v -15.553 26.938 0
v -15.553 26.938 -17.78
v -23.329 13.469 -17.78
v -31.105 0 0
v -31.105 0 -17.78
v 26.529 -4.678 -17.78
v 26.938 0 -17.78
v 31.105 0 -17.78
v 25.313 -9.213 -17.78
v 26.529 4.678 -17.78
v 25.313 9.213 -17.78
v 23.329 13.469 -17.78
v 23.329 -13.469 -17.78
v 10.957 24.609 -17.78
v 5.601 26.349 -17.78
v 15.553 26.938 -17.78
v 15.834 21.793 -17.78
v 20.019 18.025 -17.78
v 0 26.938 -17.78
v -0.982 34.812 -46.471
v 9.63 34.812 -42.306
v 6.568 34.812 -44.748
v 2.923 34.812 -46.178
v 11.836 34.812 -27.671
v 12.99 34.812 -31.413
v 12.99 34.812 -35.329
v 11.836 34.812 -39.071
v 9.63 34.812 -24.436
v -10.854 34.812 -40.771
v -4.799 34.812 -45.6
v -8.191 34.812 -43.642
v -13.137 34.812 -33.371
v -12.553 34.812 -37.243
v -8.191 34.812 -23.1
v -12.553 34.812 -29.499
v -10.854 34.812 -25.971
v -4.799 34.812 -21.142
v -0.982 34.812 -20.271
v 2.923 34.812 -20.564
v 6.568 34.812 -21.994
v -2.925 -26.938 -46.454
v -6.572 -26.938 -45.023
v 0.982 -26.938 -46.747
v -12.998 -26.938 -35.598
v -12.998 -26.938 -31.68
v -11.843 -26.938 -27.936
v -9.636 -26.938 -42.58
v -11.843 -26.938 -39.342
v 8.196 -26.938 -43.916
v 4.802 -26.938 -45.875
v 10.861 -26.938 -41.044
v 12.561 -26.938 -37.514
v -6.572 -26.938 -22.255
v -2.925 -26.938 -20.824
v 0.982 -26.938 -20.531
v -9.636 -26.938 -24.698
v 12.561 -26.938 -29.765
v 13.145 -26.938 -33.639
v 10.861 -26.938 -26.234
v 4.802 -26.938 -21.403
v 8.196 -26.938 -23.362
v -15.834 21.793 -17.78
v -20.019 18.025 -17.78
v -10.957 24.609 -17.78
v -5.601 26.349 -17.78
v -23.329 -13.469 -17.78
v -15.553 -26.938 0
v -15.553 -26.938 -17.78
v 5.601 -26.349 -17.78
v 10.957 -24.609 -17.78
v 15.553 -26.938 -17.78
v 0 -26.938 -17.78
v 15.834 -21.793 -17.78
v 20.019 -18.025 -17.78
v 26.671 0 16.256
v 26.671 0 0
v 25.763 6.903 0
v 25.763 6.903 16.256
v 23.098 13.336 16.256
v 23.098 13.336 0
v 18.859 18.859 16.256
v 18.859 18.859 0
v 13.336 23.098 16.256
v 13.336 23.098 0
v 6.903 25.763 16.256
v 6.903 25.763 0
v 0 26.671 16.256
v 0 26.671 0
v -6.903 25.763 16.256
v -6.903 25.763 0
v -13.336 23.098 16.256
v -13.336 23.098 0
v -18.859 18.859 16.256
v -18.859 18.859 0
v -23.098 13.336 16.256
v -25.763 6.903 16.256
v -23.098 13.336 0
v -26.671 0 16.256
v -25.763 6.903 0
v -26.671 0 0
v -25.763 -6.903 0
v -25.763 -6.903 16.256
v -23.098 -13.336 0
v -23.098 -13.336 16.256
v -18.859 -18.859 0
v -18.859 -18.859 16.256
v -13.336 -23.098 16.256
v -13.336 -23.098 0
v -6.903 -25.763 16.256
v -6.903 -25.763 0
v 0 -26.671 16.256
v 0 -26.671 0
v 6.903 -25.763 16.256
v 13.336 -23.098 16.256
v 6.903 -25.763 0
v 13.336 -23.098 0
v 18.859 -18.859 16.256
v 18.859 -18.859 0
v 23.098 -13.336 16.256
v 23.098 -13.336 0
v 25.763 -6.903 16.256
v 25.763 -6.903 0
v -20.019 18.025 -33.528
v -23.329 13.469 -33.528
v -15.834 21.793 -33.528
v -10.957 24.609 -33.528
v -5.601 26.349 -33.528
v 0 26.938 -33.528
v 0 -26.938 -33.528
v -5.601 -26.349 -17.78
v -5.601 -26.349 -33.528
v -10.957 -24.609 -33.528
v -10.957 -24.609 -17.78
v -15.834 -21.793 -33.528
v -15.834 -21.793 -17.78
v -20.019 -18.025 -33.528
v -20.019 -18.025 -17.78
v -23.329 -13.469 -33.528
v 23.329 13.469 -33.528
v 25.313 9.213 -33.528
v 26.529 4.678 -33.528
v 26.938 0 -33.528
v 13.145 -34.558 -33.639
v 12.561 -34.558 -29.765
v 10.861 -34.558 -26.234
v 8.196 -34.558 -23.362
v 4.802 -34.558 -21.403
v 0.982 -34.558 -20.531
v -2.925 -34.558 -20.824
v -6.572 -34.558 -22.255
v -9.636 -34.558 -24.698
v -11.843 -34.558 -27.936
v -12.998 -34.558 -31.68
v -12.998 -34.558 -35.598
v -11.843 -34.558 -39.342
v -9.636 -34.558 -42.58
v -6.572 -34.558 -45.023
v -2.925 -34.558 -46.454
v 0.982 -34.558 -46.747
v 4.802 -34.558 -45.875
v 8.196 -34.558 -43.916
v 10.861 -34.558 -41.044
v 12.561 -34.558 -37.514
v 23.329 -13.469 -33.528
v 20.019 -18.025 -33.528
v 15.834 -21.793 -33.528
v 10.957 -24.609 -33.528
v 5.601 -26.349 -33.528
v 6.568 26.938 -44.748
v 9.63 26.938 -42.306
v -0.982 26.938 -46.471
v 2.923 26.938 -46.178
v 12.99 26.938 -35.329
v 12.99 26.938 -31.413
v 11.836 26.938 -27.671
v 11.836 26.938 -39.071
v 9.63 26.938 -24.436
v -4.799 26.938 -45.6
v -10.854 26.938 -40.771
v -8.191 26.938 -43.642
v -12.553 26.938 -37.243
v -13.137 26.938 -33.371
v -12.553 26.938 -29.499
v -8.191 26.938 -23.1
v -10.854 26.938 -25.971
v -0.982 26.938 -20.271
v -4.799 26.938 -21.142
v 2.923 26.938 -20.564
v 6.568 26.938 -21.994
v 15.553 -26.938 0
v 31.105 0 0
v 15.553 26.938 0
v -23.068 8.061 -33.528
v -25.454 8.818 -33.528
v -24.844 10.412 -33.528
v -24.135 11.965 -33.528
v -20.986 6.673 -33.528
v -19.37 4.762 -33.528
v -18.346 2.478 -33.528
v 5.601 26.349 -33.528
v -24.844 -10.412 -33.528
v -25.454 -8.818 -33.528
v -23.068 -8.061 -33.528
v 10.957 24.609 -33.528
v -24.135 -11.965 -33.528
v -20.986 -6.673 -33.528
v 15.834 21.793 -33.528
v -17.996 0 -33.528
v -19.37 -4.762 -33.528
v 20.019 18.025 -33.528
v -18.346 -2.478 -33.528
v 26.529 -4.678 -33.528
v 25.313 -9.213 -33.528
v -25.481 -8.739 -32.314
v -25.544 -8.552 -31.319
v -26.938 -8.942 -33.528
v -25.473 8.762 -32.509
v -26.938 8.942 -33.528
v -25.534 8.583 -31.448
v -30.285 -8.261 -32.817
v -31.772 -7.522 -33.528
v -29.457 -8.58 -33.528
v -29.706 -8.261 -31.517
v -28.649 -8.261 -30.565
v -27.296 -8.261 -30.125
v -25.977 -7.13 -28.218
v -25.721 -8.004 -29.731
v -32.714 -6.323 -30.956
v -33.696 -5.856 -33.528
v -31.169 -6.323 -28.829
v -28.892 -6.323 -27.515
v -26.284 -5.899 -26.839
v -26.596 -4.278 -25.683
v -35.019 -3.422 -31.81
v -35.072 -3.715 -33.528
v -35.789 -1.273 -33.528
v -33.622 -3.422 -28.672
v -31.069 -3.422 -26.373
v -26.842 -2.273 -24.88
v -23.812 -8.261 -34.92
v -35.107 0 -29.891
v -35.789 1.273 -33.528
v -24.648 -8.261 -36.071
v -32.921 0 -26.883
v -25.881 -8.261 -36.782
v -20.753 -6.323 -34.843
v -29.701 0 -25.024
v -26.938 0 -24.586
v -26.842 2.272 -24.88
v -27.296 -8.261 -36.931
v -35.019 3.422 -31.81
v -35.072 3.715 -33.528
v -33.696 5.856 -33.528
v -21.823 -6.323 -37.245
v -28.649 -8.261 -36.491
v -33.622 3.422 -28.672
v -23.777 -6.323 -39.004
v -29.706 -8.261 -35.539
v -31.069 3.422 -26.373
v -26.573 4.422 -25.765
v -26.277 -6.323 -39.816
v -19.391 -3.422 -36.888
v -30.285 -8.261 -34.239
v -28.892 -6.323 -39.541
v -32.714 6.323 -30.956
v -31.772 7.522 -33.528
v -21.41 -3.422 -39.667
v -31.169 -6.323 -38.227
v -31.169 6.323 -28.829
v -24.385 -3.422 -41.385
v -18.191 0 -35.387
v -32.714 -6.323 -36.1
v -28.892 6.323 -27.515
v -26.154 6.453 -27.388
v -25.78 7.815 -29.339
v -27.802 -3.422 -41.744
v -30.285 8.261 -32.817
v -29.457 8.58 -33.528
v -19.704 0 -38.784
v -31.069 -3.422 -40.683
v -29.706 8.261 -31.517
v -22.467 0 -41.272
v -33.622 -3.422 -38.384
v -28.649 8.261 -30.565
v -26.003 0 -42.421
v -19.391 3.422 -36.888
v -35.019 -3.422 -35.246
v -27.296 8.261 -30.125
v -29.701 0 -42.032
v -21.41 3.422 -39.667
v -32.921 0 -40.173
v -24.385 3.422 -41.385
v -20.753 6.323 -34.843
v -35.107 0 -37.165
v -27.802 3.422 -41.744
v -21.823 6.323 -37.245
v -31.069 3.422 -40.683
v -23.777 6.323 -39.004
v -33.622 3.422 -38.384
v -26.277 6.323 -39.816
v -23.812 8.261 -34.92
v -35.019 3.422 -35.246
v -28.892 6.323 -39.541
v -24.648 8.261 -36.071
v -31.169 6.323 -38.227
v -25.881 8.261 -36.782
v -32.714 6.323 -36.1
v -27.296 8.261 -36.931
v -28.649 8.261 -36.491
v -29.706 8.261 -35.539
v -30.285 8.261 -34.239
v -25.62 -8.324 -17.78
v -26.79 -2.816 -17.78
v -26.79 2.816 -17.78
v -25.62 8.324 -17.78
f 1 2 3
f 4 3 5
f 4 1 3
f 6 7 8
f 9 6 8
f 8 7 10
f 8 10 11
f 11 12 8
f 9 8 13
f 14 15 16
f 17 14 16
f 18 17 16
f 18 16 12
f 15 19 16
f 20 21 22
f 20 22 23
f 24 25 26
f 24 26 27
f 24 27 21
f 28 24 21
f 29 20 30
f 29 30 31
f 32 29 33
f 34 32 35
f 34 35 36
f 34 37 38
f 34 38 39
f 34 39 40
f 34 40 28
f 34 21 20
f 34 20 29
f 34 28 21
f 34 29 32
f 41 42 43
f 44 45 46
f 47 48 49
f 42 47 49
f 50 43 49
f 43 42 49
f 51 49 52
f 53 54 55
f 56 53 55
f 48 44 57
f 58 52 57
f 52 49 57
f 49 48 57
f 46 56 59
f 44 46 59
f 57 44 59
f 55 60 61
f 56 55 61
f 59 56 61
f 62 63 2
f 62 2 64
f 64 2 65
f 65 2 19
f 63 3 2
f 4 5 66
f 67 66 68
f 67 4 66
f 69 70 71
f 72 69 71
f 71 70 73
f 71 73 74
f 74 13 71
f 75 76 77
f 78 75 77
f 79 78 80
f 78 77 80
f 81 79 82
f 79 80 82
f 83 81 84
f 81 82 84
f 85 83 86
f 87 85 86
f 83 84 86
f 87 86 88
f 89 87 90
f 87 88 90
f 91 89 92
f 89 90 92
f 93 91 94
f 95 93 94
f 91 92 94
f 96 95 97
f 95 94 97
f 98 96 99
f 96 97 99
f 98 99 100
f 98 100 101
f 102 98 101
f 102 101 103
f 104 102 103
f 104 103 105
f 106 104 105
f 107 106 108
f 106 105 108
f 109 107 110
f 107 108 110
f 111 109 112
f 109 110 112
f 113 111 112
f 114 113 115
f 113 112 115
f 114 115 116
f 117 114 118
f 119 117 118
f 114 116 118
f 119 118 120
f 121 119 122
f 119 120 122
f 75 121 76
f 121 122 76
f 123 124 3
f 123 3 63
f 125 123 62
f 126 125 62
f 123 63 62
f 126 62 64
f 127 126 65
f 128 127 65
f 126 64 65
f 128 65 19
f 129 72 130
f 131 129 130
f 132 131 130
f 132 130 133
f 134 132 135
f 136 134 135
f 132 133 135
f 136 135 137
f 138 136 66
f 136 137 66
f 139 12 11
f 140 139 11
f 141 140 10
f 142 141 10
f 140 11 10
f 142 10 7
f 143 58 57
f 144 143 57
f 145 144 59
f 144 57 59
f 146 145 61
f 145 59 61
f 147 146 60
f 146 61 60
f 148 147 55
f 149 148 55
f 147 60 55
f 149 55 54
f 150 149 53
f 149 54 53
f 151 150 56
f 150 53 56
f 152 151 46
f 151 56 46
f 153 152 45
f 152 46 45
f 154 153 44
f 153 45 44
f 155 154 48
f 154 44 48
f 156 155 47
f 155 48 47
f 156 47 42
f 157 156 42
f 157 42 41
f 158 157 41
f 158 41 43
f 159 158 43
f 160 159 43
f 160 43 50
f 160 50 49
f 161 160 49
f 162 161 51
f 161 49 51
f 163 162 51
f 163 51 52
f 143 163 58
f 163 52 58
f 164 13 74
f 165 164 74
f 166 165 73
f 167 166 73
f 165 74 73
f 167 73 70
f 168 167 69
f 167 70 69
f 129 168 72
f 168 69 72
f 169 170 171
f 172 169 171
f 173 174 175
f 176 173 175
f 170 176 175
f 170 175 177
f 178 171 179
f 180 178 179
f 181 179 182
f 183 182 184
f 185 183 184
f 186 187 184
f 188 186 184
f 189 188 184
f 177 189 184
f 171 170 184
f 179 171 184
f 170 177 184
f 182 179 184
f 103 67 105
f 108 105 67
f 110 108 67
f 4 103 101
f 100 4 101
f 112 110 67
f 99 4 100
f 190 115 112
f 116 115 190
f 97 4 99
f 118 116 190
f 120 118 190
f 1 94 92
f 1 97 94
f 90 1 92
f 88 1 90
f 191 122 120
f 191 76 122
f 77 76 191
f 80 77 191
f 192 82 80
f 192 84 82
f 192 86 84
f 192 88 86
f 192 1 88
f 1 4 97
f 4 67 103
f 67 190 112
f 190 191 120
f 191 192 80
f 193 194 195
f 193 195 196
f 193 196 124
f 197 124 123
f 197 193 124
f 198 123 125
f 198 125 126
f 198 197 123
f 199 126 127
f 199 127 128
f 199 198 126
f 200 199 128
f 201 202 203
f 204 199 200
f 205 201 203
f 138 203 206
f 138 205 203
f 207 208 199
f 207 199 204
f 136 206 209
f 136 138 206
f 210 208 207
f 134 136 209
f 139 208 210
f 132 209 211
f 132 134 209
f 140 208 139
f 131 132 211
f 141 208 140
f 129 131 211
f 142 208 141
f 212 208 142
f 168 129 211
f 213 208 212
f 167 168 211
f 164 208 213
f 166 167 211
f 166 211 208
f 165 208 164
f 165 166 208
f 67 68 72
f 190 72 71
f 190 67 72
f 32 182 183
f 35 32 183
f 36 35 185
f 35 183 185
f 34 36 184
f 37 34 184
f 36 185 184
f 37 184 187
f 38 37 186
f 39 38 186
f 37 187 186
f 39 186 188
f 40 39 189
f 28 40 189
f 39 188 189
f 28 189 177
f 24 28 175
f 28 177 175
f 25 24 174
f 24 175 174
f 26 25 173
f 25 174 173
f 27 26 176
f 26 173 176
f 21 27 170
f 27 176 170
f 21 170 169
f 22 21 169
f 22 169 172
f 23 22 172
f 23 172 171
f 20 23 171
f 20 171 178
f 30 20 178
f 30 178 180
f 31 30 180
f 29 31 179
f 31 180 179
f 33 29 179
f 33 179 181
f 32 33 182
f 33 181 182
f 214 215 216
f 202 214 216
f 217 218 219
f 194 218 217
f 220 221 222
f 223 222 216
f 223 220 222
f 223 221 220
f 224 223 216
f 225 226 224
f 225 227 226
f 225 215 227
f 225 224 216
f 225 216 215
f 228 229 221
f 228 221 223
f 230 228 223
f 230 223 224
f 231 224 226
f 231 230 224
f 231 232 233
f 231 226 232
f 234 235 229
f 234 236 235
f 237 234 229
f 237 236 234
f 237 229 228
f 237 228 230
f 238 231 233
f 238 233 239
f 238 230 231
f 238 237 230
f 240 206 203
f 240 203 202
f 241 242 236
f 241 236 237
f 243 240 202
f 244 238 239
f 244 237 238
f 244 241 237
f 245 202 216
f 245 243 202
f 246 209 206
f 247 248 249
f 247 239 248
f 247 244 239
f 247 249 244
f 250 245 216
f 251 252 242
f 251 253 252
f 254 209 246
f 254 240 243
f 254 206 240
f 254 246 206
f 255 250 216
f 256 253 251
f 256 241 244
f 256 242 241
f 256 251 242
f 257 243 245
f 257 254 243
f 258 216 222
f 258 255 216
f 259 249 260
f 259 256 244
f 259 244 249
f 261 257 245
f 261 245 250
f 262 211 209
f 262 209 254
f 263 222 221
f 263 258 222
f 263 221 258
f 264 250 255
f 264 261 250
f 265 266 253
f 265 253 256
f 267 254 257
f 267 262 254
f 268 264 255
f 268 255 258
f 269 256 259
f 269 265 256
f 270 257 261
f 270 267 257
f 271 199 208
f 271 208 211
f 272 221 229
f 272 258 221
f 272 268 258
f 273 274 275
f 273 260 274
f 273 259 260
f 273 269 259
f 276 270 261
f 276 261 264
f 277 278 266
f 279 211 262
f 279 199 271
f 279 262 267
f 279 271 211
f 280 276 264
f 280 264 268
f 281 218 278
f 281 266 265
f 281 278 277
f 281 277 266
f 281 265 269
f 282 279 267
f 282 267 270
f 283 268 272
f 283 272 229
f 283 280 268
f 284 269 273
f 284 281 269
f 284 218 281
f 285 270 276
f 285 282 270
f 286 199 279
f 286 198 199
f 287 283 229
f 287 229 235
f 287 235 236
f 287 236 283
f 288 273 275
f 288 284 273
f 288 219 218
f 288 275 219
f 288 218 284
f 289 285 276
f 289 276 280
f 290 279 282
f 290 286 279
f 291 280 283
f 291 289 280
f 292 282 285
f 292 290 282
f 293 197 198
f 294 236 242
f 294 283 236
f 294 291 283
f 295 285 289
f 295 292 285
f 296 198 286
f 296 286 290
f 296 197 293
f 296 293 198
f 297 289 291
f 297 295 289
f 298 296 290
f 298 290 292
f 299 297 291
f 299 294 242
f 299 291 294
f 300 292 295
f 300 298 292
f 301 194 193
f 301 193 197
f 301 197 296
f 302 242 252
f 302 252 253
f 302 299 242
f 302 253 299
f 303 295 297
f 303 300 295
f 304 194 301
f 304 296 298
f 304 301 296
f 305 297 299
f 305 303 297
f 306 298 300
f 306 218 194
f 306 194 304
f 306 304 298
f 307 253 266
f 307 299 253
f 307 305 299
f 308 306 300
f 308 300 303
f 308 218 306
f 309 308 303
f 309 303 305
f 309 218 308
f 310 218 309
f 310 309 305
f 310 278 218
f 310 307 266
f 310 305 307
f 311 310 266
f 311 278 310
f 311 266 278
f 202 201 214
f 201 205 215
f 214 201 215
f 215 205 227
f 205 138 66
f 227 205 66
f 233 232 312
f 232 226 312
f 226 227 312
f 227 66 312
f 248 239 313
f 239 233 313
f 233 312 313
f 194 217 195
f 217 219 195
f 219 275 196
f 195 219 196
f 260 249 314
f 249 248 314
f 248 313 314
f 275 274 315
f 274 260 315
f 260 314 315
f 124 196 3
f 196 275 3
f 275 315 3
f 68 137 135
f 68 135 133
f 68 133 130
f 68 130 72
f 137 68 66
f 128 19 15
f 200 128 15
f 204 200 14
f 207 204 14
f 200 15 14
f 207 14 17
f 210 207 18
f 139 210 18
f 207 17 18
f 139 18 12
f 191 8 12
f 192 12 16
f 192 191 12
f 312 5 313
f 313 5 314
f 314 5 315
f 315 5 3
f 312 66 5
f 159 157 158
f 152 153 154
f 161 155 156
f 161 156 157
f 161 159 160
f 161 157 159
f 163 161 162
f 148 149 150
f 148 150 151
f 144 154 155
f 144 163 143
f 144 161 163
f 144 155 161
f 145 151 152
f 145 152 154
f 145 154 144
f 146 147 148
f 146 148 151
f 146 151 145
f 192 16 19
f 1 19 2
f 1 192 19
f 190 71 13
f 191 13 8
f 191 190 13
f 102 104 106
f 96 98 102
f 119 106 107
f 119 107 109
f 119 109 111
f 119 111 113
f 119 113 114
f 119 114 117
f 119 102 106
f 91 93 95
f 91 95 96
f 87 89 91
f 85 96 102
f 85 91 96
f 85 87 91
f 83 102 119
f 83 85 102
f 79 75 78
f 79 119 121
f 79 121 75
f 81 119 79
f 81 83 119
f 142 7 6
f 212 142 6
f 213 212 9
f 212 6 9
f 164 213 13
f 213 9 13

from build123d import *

# Parameters (mm, degrees)
F0_R     = 26.671348359
F1_DEPTH = 16.256
F3_DEPTH = 17.78
F5_DEPTH = 15.748
F6_R     = 13.1367039981
F7_DEPTH = 7.874
F8_R     = 13.144903068
F9_DEPTH = 7.62


# Not quite as in the source:
# - the program builds the solid bodies; features that only make, move or delete a surface that nothing else refers to are left out


with BuildPart() as f1:
    # F0 (on Top) → F1 (new body)
    with BuildSketch(Plane.XY):
        Circle(F0_R)
    extrude(amount=F1_DEPTH)

    # F2 (on Top) → F3 (join)
    with BuildSketch(Plane.XY):
        Polygon((15.5526856108, 26.9380416721), (-15.5526856108, 26.9380416721), (-31.1053712217, 0), (-15.5526856108, -26.9380416721), (15.5526856108, -26.9380416721), (31.1053712217, 0), align=None)
    extrude(amount=-F3_DEPTH)

    # F4 (on face) → F5 (join)
    with BuildSketch(Plane(origin=(0, 0, -17.78), x_dir=(1, 0, 0), z_dir=(0, 0, -1))):
        with BuildLine():
            ThreePointArc((23.3290284987, -13.4690206932), (26.0201501821, -6.9720781429), (26.9380416721, 0))
            ThreePointArc((26.9380416721, 0), (26.0201501337, 6.9720783236), (23.3290283116, 13.4690210173))
            ThreePointArc((23.3290283116, 13.4690210173), (13.4690207454, 23.3290284686), (0, 26.9380416721))
            ThreePointArc((0, 26.9380416721), (-13.4690205688, 23.3290285706), (-23.3290281076, 13.4690213707))
            ThreePointArc((-23.3290281076, 13.4690213707), (-26.9380416721, 4.834e-07), (-23.329028591, -13.4690205333))
            ThreePointArc((-23.329028591, -13.4690205333), (-13.4690209874, -23.3290283289), (0, -26.9380416721))
            ThreePointArc((0, -26.9380416721), (13.4690209075, -23.329028375), (23.3290284987, -13.4690206932))
        make_face()
    extrude(amount=F5_DEPTH)

    # F12 (on face) → F13 (revolve)
    with BuildSketch(Plane(origin=(0, 0, -33.528), x_dir=(1, 0, 0), z_dir=(0, 0, -1))):
        with BuildLine():
            Line((-26.9380416721, 1.35e-08), (-26.9380416721, 8.9419854241))
            ThreePointArc((-26.9380416721, 8.9419854241), (-35.8800270962, 0), (-26.9380416721, -8.9419854241))
            Line((-26.9380416721, -8.9419854241), (-26.9380416721, 1.35e-08))
        make_face()
    revolve(axis=Axis((-26.9380416721, 0, -33.528), (0, 1, 0)))


with BuildPart() as f7:
    # F6 (on face) → F7 (new body)
    with BuildSketch(Plane(origin=(0, 26.9380416721, 0), x_dir=(-1, 0, 0), z_dir=(0, 1, 0))):
        with Locations((0, -33.3710052073)):
            Circle(F6_R)
    extrude(amount=F7_DEPTH)


with BuildPart() as f9:
    # F8 (on face) → F9 (new body)
    with BuildSketch(Plane.XZ.offset(26.9380416721)):
        with Locations((0, -33.6390472949)):
            Circle(F8_R)
    extrude(amount=F9_DEPTH)


solid = Compound([f1.part, f7.part, f9.part])
